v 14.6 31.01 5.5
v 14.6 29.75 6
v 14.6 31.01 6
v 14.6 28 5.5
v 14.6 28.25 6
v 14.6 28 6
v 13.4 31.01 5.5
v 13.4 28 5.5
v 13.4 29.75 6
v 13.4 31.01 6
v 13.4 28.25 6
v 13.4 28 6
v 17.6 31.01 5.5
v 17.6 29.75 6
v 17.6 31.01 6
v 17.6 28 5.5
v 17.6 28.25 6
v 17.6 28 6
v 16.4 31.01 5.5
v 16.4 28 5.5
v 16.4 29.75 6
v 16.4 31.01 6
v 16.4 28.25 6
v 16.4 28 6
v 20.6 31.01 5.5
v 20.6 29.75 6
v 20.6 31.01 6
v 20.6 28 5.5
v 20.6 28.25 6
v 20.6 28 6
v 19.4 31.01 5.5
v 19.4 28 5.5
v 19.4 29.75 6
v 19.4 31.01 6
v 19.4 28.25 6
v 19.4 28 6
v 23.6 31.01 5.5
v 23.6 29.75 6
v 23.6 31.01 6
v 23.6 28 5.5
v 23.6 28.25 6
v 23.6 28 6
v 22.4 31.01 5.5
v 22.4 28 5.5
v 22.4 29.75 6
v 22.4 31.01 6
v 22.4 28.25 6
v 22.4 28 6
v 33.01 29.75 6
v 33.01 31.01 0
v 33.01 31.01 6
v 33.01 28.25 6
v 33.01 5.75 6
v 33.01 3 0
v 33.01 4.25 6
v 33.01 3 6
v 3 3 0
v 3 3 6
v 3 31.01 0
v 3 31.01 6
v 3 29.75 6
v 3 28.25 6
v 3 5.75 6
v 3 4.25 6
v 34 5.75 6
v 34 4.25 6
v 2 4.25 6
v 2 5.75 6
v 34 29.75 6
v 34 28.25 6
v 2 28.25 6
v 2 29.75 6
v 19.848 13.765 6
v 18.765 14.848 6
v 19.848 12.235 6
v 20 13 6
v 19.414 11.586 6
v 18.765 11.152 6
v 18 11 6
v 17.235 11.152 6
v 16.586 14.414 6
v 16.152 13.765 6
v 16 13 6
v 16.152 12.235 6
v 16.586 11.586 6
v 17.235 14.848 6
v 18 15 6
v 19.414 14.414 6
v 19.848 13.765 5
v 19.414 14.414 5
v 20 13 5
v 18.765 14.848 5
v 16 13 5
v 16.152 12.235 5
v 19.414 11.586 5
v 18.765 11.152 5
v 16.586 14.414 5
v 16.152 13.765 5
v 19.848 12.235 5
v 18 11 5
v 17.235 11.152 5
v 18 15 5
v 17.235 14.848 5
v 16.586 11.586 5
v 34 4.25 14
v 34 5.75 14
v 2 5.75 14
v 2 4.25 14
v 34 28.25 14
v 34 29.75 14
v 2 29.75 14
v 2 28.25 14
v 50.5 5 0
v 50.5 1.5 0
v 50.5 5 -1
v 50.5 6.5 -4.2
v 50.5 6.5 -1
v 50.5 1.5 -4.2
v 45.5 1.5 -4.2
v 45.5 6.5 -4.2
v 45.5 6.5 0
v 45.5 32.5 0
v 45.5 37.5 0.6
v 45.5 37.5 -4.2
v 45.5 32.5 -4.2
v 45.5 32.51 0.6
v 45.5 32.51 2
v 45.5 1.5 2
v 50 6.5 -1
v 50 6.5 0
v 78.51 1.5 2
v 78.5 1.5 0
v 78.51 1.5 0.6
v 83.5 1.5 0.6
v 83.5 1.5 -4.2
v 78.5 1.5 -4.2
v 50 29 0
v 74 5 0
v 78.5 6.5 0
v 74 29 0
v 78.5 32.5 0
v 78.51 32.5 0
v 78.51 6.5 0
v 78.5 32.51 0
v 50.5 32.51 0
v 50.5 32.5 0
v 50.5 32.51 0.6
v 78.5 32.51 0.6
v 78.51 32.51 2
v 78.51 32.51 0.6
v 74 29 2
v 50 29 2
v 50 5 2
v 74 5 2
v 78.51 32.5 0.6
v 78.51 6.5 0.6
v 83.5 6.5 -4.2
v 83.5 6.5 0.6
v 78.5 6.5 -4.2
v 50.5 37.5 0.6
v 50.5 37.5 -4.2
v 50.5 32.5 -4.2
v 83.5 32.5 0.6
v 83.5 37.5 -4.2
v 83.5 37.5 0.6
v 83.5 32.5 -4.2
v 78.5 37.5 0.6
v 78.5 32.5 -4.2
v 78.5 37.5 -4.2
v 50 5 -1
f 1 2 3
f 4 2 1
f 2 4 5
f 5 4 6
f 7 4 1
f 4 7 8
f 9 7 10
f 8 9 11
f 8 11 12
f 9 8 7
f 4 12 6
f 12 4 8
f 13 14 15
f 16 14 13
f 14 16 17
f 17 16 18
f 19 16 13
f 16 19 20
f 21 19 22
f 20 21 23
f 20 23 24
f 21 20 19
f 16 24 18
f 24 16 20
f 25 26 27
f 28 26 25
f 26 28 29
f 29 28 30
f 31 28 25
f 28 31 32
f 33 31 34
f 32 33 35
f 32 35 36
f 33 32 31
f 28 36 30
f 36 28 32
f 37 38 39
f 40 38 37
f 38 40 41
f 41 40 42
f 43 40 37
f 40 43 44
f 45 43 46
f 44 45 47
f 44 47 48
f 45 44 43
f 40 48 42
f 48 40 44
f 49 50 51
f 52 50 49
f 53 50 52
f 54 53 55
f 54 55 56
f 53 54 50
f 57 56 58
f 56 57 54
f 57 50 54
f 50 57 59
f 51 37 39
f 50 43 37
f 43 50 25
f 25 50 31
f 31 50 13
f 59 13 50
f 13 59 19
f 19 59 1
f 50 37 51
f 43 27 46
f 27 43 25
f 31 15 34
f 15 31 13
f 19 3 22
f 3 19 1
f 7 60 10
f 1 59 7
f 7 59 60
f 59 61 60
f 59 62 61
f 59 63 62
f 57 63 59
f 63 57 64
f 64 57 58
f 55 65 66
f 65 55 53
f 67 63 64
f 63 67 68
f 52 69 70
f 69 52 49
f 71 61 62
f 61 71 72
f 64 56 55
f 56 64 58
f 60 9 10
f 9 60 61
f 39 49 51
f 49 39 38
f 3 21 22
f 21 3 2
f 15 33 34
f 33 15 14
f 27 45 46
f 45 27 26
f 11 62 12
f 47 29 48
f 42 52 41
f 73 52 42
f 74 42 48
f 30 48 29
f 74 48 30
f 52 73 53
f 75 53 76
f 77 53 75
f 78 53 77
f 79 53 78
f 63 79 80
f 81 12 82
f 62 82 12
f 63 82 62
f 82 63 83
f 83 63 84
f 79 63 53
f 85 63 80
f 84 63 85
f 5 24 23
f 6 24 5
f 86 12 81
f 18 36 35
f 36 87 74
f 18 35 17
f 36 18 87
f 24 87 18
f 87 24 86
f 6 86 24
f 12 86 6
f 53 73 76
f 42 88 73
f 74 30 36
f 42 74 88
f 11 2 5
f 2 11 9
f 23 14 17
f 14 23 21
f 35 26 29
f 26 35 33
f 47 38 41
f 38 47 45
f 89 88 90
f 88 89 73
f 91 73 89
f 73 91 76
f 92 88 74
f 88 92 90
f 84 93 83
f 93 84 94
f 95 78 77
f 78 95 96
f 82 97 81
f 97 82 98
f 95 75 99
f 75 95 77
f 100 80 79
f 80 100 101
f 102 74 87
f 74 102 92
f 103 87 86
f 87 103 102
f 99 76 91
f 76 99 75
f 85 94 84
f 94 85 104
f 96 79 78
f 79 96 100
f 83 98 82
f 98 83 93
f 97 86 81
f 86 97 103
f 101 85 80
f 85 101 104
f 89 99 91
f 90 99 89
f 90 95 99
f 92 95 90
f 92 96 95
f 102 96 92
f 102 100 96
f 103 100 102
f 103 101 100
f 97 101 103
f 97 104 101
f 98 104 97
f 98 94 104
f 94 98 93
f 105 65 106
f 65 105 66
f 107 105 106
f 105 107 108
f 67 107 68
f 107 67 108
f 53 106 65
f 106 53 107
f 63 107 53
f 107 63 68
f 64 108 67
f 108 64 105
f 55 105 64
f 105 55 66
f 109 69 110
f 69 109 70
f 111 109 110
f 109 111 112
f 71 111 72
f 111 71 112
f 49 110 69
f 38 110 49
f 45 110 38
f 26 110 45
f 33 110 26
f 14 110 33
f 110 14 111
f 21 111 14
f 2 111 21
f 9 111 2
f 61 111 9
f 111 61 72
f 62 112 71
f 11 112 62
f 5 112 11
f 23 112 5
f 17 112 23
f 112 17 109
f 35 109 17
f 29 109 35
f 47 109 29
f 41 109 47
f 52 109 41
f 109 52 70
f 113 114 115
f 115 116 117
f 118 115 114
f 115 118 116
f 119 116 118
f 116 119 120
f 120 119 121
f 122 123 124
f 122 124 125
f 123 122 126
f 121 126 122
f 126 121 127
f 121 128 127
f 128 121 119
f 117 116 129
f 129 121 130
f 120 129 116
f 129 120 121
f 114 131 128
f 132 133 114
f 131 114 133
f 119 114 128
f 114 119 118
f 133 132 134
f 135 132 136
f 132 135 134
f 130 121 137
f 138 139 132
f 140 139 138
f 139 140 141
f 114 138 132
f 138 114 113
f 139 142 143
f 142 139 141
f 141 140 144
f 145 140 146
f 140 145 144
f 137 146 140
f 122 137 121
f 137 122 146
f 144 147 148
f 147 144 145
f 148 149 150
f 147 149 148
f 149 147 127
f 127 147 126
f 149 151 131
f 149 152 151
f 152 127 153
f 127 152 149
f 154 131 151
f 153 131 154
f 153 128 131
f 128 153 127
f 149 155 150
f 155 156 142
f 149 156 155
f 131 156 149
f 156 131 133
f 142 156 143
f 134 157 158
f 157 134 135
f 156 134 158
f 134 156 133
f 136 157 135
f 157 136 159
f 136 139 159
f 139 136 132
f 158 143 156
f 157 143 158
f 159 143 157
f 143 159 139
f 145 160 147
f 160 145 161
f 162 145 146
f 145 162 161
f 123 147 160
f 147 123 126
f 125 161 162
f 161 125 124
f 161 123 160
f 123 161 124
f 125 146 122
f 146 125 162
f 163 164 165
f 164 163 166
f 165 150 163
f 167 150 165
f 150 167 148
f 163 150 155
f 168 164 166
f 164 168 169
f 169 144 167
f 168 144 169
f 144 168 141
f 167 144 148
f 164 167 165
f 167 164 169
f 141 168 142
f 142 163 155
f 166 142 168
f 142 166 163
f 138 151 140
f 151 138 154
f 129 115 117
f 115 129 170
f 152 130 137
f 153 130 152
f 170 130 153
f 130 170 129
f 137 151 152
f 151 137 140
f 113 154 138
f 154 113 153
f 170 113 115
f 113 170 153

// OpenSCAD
// Cyclops — XIAO ESP32-S3 Sense wearable enclosure  ·  V2
// Parametric OpenSCAD.  Render:  openscad cyclops_xiao_enclosure_v2.scad
// Export:  openscad -D 'PART="body"' -o v2_body.stl cyclops_xiao_enclosure_v2.scad
//          openscad -D 'PART="lid"'  -o v2_lid.stl  cyclops_xiao_enclosure_v2.scad
//
// COORDINATE FRAME (consistent everywhere): corner-origin.
//   body : x[0..body_l]  y[0..body_w]  z[0..body_H], sits on z=0.
//   +X / -X = the SHORT ends (button bank on +X, USB-C + lanyard on -X).
//   +Y / -Y = the LONG side walls (ventilation banks live here).
//   Pocket interior is carved x[wall..body_l-wall] y[wall..body_w-wall]
//   z[base_h..body_H]; it is OPEN at the top so the board + screen drop in and
//   the lid caps the rim. The wall above z=body_h is the lock lip (a rim).
//
// V2 changes over v1:
//   1. VENTILATION — the XIAO + ST7735 get warm; v1 trapped heat and muffled
//      the MEMS mic. v2 adds lateral vent slots on BOTH long side walls, each
//      backed by an inboard air-gap baffle (pocket stays closed to fingers /
//      splash while air curls over the baffle into the pocket), a clear front
//      mic port, and a floor chimney for convection.
//   2. CLIP FIT — a real cantilever snap-fit: the body top wall forms a lock
//      lip; the lid overhangs and caps the whole top, and four living-hinge
//      claws on its underside drop past the lip and hook under the rim, clicking
//      home with no glue / tools / hardware. Four ratchet dots on the lid
//      underside catch the lip top for a satisfying detent.
//
// Board: XIAO ESP32-S3 Sense (21.0 x 17.5 mm). Screen: ST7735 1.8" (glass 28x28).
// Pins: BTN_A=GPIO3, BTN_B=GPIO5, WHEEL_B=GPIO4 (holes on +X end). Mic = MEMS
// on the Sense module (front -Y wall port).

// ---- parameters ----
xiao_l   = 21.0;   // board length (mm)
xiao_w   = 17.5;   // board width
wall     = 2.0;    // wall thickness
base_h   = 6.0;    // pocket floor depth (board sits on it)
pocket_h = 9.0;    // interior pocket height above floor
lip_h    = 2.4;    // raised lock lip height above body top
body_h   = base_h + pocket_h;        // 15.0 main body height
body_H   = body_h + lip_h;           // 17.4 total height (incl lip)

// the screen glass drives the case width (it is the biggest component)
screen_glass = 28.0;  // ST7735 visible glass
body_l = screen_glass + 2*wall + 4;  // 36.0  (length, incl end caps)
body_w = screen_glass + 2*wall + 2;  // 34.0  (width)

// lid overhangs the body so it caps the lip from outside
lid_overhang = 1.5;
lid_l  = body_l + 2*lid_overhang;    // 39.0
lid_w  = body_w + 2*lid_overhang;    // 37.0
win    = 24.0;    // lid viewing window (reveal); < lid so plate + claws stay

// closure geometry
tab_w      = 5.0;   // snap claw footprint
tab_drop   = 4.2;   // how far claws hang below the lid
tab_hook   = 3.0;   // inward hook length at claw tip
ratch_d    = 1.8;   // ratchet detent dot diameter
c          = tab_w/2 + 0.5;   // corner anchor inset (3.0)

// ventilation geometry
vent_rows  = 3;     // rows of vents per side (vertical)
vent_cols  = 4;     // vents per row (along X)
vent_w     = 2.2;   // individual slot width (along X)
vent_h     = 5.0;   // individual slot height (vertical, Z)
vent_gap_x = 3.0;   // spacing along X
vent_gap_y = 3.0;   // spacing between rows (Z)
vent_z     = 7.0;   // first row height above floor
mic_port_d = 4.0;   // acoustic mic port diameter

$fn = 24;

// ---- helpers ----
module rounded_box(l,w,h,r=2.0){
  hull(){
    translate([ r,   r,    0]) cube([l-2*r, w-2*r, h]);
    translate([ r,   w-r,   0]) cube([l-2*r, 0.01,  h]);
    translate([ l-r, r,     0]) cube([0.01,  w-2*r, h]);
    translate([ l-r, w-r,   0]) cube([0.01,  0.01,  h]);
  }
}

// round-rect prism (long axis = local Z); used for vent slots
module vent_slot(w,h,depth){
  hull(){
    for(sx=[-1,1])
      translate([sx*(w/2-1), -h/2+1, 0]) cube([1, h-2, depth]);
    for(sx=[-1,1])
      translate([sx*(w/2-1), h/2-1, 0]) cube([1, 1, depth]);
  }
}

// cylindrical hole driven along X (pierces a short END wall)
module end_hole(x_wall, y, z, d){
  translate([x_wall, y, z]) rotate([0,90,0])
    cylinder(d=d, h=wall+3, $fn=20);
}
// cylindrical hole driven along Y (pierces a long SIDE wall)
module side_hole(y_wall, x, z, d){
  translate([x, y_wall, z]) rotate([90,0,0])
    cylinder(d=d, h=wall+3, $fn=20);
}

// ---- ventilation: banks on the two long side walls ----
// Slot long-axis runs along X, height is vertical (Z); the hole is driven along
// Y so it pierces the side wall. y_face = the wall centre in corner-origin frame.
module vent_bank_side(y_face){
  for(r=[0:vent_rows-1])
    for(col=[0:vent_cols-1]){
      vx = body_l/2 + (col - (vent_cols-1)/2) * vent_gap_x;
      vz = vent_z + r * vent_gap_y;
      translate([vx, y_face, vz])
        rotate([90,0,0])
          vent_slot(vent_w, vent_h, wall+3);
    }
}

// air-gap baffles: a thin fin parallel to each long side wall, attached to the
// pocket floor, rising most of the pocket height, set inboard. The vent slot
// opens into the narrow channel between the wall and the baffle; sightline from
// the exterior to the interior is blocked (no finger/splash straight-through)
// but air enters the channel and curls over the baffle top into the pocket.
// ADDED (unioned) to the body, attached to the floor => one manifold, printable.
module airgap_baffles(){
  baffle_off = (body_w/2) - wall - 3.0;   // inboard of each side wall
  baffle_t   = 1.5;                       // fin thickness (Y)
  baffle_top = body_h - 1.0;              // leave 1mm gap over the top
  for(side=[-1,1]){
    yc = body_w/2 + side*baffle_off;
    translate([wall, yc - baffle_t/2, base_h])
      cube([body_l - 2*wall, baffle_t, baffle_top - base_h]);
  }
}

// board-clearance chimney through the pocket floor (passive convection)
module chimney(){
  translate([body_l/2, body_w/2 - 4, base_h-1])
    cylinder(d=4.0, h=base_h+2, $fn=16);
}

// ---- BODY (single watertight solid) ----
// Outer shell (full height incl. lip) with the pocket carved OPEN to the top so
// the board drops in and the lid caps the rim. The outer wall stays solid all
// the way up to form the lock lip. All subtractive features pierce fully so the
// carves stay watertight. Air-gap baffles are UNIONED onto the shell (attached
// to the floor) so they add structure, not void. Screen is visible through the
// open pocket (no top window needed on the body).
module body(){
  union(){
    difference(){
      rounded_box(body_l, body_w, body_H, 3);
      // interior pocket, OPEN at top (carved to body_H)
      translate([wall, wall, base_h])
        cube([body_l-2*wall, body_w-2*wall, body_H - base_h]);
      // USB-C cutout on -X end (rectangular slot piercing the end wall)
      translate([-2, body_w/2-5, base_h+1]) cube([6, 10, 5]);
      // button holes on +X end: BTN_A (3) / BTN_B (5) / WHEEL_B (4)
      end_hole(body_l - wall/2, body_w/2-7, base_h+4.0, 6.0);
      end_hole(body_l - wall/2, body_w/2+7, base_h+4.0, 6.0);
      end_hole(body_l - wall/2, body_w/2,   base_h+4.5, 6.0);
      // two lanyard/strap slots on -X end
      translate([-1, body_w/2-11, body_H/2-1.5]) cube([4, 8, 3]);
      translate([-1, body_w/2+3,  body_H/2-1.5]) cube([4, 8, 3]);
      // ventilation banks on both long side walls
      vent_bank_side( body_w - wall/2);   // +Y wall
      vent_bank_side( wall/2);            // -Y wall
      // front mic port on -Y wall (clear acoustic path, no baffle)
      side_hole( wall/2, body_l/2-6, base_h+3, mic_port_d);
      chimney();
    }
    airgap_baffles();
  }
}

// ---- LID (snap-fit) ----
// Overhangs and caps the whole top (footprint = body + overhang). Four claws
// hang from the underside at the corners, drop past the lip, and hook inward
// under the rim. Four ratchet dots on the underside catch the lip top. A viewing
// window is cut through the plate so the ST7735 shows through. Authored at
// z=0..lid_t; everything overlaps the plate => one manifold solid.
module snap_claw(cx, cy, dirx, diry){
  // cx,cy = corner anchor on the lid underside; dirx/diry = outward direction
  // post overlaps 0.6 into the plate so the union is one manifold
  translate([cx, cy, -tab_drop]){
    cube([tab_w, tab_w, tab_drop + 0.6]);
    // inward hook at the bottom that grabs the lip underside
    translate([dirx*(tab_w/2 - tab_hook/2),
               diry*(tab_w/2 - tab_hook/2),
               tab_drop - 1.2])
      cube([dirx*tab_hook, diry*tab_hook, 1.4]);
  }
}

module lid(){
  lid_t = 2.0;
  // center the lid over the body (body 0..body_l, lid overhangs symmetrically)
  off = (lid_l - body_l)/2;   // 1.5
  translate([-off, -off, 0])
  difference(){
    union(){
      // lid plate (caps the top, overhangs the lip)
      rounded_box(lid_l, lid_w, lid_t, 3);
      // four snap claws at the corners (attached to plate underside)
      snap_claw( c,            c,            1,  1);
      snap_claw( lid_l - c,    c,           -1,  1);
      snap_claw( c,            lid_w - c,    1, -1);
      snap_claw( lid_l - c,    lid_w - c,   -1, -1);
      // ratchet detent dots (catch the lip top), just inside the rim, poking down
      for(sx=[0:1], sy=[0:1]){
        px = sx ? lid_l - (wall+3) : (wall+3);
        py = sy ? lid_w - (wall+3) : (wall+3);
        // ball centred in the plate so it is one manifold (not a floating bead)
        translate([px, py, lid_t/2])
          sphere(d=ratch_d, $fn=16);
      }
    }
    // viewing window through the lid plate (matches the pocket so the ST7735
    // shows through). win < lid so the plate + claws stay intact.
    translate([lid_l/2 - win/2, lid_w/2 - win/2, -1])
      cube([win, win, lid_t+2]);
  }
}

// ---- render dispatcher ----
// Do NOT set `PART = undef;` here — it overrides the -D command-line value and
// silently breaks per-part export. Leave PART undefined; the is_undef guard
// below renders the default (both parts) when no -D is passed.
if (!is_undef(PART) && PART=="body") body();
else if (!is_undef(PART) && PART=="lid") lid();
else { body(); translate([body_l+8,0,0]) lid(); }

// ---- printable orientation / notes ----
// Print body upside-down (open pocket up). Lid print flat, claws up.
// Snap claws are thin living hinges — tune tab_drop/tab_hook if brittle.
// Scale holes 1.05x if your printer runs tight. Air-gap baffles keep the pocket
// closed to fingers/splash while the side vents + floor chimney give passive
// convection. Lid drops over the body: plate seats over the lock lip, claws snap
// under the rim, ratchet dots settle on the lip top for a tool-free detent.
